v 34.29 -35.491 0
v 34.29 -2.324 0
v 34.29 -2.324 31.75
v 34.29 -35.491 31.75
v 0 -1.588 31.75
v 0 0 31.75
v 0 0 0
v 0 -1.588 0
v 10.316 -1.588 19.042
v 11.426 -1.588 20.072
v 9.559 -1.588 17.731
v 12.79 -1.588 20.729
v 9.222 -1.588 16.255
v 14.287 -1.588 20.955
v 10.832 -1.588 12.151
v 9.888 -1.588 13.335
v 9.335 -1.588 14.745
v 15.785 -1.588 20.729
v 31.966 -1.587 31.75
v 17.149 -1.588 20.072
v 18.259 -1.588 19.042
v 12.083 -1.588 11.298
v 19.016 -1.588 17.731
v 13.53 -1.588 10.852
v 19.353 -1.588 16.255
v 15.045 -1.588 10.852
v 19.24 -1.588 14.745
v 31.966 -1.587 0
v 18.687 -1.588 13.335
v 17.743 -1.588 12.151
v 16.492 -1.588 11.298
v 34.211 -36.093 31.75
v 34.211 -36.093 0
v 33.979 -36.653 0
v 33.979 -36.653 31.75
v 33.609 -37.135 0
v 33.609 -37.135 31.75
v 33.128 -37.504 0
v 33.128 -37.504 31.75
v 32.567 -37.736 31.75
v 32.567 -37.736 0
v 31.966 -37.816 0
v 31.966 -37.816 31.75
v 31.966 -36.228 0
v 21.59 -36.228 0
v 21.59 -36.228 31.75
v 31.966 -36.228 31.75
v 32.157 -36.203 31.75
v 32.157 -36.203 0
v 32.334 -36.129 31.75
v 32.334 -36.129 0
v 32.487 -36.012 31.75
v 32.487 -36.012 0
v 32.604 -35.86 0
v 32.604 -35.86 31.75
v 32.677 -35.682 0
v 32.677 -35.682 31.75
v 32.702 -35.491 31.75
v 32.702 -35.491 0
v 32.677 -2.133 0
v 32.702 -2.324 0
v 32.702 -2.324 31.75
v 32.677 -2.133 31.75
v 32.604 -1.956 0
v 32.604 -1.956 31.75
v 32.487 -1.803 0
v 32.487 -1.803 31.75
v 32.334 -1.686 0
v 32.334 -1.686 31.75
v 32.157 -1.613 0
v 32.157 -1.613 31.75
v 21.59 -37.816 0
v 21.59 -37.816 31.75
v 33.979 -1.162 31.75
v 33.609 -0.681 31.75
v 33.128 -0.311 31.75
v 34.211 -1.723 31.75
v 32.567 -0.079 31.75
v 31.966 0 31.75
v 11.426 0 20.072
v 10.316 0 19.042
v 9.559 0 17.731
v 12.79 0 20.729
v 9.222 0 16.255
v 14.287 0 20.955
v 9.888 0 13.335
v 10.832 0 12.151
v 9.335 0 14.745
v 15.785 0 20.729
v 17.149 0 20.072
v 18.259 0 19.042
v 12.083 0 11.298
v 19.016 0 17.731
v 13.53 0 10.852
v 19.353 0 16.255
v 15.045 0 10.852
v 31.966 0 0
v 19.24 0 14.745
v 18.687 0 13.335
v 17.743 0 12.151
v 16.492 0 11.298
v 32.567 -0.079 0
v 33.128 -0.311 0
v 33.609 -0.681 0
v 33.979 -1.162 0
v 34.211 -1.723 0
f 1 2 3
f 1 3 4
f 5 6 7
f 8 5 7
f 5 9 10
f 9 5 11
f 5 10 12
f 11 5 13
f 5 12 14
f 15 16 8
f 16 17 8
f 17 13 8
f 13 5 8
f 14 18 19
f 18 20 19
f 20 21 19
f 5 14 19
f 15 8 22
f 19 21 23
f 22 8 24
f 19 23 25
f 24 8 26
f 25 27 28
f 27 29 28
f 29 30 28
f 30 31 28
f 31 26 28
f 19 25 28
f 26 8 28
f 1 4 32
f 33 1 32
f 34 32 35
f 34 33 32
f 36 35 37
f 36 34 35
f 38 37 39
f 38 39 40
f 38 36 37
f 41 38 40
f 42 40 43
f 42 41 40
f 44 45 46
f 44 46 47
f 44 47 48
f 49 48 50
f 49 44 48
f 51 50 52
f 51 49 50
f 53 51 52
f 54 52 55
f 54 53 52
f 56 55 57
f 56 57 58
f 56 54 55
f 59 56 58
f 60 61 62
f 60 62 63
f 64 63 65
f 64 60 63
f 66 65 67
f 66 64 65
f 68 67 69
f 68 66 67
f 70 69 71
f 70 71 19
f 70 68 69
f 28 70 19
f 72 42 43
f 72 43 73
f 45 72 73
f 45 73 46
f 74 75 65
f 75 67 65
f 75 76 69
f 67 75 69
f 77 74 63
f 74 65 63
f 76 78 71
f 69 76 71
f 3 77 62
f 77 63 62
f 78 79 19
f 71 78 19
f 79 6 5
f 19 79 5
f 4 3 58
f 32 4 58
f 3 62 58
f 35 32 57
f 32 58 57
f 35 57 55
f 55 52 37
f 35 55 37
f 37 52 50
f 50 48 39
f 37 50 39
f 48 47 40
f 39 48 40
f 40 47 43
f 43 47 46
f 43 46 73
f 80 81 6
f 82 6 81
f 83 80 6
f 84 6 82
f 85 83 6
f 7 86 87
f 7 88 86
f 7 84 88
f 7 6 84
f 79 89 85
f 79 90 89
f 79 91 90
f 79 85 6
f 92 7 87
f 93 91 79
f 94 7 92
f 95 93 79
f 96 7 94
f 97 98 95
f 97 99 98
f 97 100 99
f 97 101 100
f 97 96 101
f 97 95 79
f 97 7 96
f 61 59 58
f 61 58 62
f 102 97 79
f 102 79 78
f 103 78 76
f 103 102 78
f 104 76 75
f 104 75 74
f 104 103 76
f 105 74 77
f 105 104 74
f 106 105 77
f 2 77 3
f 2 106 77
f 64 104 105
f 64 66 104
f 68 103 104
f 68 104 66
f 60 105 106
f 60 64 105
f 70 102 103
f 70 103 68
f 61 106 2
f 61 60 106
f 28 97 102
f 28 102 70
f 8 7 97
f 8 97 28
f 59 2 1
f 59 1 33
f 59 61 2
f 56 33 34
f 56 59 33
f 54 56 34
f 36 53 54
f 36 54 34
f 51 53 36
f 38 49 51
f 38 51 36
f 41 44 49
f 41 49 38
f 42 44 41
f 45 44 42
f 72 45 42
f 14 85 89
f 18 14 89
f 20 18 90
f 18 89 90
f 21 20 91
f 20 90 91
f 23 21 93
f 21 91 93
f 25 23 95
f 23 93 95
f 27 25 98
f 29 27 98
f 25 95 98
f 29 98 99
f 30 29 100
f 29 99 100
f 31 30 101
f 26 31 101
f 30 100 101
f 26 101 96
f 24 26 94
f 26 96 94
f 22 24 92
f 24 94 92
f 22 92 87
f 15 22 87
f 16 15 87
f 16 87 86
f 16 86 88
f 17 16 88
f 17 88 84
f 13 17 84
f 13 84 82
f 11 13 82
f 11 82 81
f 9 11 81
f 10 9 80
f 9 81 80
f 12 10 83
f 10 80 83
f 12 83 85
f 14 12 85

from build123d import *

# Parameters (mm, degrees)
SKETCH1_W                     = 32.7025
SKETCH1_H                     = 31.75
SKETCH1_R                     = 5.08
HV_FUSE_BASE_DEPTH            = 1.5875
FUSE_TO_STACK_STRIP_W         = 7.8232
FUSE_TO_STACK_STRIP_H         = 1.5875
FUSE_TO_STACK_STRIP_CUT_DEPTH = 31.75
FUSE_TO_STACK_DEPTH           = 31.75
STACK_BASE_STRIP_W            = 7.8232
STACK_BASE_STRIP_H            = 1.5875
STACK_BASE_STRIP_CUT_DEPTH    = 31.75
STACK_BASE_DEPTH              = 31.75


# Sheet-metal steps are written as plain solids
with BuildPart() as part:
    # Sketch1 → HV Fuse Base (new body)
    with BuildSketch(Plane(origin=(0, 0, 0), x_dir=(1, 0, 0), z_dir=(0, 1, 0))):
        with Locations((16.35125, -15.875)):
            Rectangle(SKETCH1_W, SKETCH1_H)
        with Locations(Location((14.2875, -15.875, 0), (0, 0, 270))):
            Circle(SKETCH1_R, mode=Mode.SUBTRACT)
    extrude(amount=-HV_FUSE_BASE_DEPTH)

    # Fuse to Stack strip (across the edge) → Fuse to Stack strip cut (cut)
    with BuildSketch(Plane(origin=(32.7025, -1.5875, 0), x_dir=(-1, 0, 0), z_dir=(0, 0, 1))):
        with Locations((-3.175, -0.79375)):
            Rectangle(FUSE_TO_STACK_STRIP_W, FUSE_TO_STACK_STRIP_H)
    extrude(amount=FUSE_TO_STACK_STRIP_CUT_DEPTH, mode=Mode.SUBTRACT)

    # Fuse to Stack section (across the edge) → Fuse to Stack (add)
    with BuildSketch(Plane(origin=(32.7025, -1.5875, 0), x_dir=(-1, 0, 0), z_dir=(0, 0, 1))):
        with BuildLine():
            Line((-1.5875, 0.7366), (-1.5875, 36.22802))
            Line((-1.5875, 36.22802), (0, 36.22802))
            Line((0, 36.22802), (0, 0.7366))
            ThreePointArc((0, 0.7366), (0.215745145, 0.215745145), (0.7366, 0))
            Line((0.7366, 0), (0.7366, -1.5875))
            ThreePointArc((0.7366, -1.5875), (-0.90678687, -0.90678687), (-1.5875, 0.7366))
        make_face()
    extrude(amount=FUSE_TO_STACK_DEPTH)

    # Stack Base strip (across the edge) → Stack Base strip cut (cut)
    with BuildSketch(Plane(origin=(32.7025, -37.81552, 0), x_dir=(0, 1, 0), z_dir=(0, 0, 1))):
        with Locations((-1.5875, -0.79375)):
            Rectangle(STACK_BASE_STRIP_W, STACK_BASE_STRIP_H)
    extrude(amount=STACK_BASE_STRIP_CUT_DEPTH, mode=Mode.SUBTRACT)

    # Stack Base section (across the edge) → Stack Base (add)
    with BuildSketch(Plane(origin=(32.7025, -37.81552, 0), x_dir=(0, 1, 0), z_dir=(0, 0, 1))):
        with BuildLine():
            Line((0, 0.7366), (0, 11.1125))
            Line((0, 11.1125), (1.5875, 11.1125))
            Line((1.5875, 11.1125), (1.5875, 0.7366))
            ThreePointArc((1.5875, 0.7366), (1.803245145, 0.215745145), (2.3241, 0))
            Line((2.3241, 0), (2.3241, -1.5875))
            ThreePointArc((2.3241, -1.5875), (0.68071313, -0.90678687), (0, 0.7366))
        make_face()
    extrude(amount=STACK_BASE_DEPTH)


solid = part.part
